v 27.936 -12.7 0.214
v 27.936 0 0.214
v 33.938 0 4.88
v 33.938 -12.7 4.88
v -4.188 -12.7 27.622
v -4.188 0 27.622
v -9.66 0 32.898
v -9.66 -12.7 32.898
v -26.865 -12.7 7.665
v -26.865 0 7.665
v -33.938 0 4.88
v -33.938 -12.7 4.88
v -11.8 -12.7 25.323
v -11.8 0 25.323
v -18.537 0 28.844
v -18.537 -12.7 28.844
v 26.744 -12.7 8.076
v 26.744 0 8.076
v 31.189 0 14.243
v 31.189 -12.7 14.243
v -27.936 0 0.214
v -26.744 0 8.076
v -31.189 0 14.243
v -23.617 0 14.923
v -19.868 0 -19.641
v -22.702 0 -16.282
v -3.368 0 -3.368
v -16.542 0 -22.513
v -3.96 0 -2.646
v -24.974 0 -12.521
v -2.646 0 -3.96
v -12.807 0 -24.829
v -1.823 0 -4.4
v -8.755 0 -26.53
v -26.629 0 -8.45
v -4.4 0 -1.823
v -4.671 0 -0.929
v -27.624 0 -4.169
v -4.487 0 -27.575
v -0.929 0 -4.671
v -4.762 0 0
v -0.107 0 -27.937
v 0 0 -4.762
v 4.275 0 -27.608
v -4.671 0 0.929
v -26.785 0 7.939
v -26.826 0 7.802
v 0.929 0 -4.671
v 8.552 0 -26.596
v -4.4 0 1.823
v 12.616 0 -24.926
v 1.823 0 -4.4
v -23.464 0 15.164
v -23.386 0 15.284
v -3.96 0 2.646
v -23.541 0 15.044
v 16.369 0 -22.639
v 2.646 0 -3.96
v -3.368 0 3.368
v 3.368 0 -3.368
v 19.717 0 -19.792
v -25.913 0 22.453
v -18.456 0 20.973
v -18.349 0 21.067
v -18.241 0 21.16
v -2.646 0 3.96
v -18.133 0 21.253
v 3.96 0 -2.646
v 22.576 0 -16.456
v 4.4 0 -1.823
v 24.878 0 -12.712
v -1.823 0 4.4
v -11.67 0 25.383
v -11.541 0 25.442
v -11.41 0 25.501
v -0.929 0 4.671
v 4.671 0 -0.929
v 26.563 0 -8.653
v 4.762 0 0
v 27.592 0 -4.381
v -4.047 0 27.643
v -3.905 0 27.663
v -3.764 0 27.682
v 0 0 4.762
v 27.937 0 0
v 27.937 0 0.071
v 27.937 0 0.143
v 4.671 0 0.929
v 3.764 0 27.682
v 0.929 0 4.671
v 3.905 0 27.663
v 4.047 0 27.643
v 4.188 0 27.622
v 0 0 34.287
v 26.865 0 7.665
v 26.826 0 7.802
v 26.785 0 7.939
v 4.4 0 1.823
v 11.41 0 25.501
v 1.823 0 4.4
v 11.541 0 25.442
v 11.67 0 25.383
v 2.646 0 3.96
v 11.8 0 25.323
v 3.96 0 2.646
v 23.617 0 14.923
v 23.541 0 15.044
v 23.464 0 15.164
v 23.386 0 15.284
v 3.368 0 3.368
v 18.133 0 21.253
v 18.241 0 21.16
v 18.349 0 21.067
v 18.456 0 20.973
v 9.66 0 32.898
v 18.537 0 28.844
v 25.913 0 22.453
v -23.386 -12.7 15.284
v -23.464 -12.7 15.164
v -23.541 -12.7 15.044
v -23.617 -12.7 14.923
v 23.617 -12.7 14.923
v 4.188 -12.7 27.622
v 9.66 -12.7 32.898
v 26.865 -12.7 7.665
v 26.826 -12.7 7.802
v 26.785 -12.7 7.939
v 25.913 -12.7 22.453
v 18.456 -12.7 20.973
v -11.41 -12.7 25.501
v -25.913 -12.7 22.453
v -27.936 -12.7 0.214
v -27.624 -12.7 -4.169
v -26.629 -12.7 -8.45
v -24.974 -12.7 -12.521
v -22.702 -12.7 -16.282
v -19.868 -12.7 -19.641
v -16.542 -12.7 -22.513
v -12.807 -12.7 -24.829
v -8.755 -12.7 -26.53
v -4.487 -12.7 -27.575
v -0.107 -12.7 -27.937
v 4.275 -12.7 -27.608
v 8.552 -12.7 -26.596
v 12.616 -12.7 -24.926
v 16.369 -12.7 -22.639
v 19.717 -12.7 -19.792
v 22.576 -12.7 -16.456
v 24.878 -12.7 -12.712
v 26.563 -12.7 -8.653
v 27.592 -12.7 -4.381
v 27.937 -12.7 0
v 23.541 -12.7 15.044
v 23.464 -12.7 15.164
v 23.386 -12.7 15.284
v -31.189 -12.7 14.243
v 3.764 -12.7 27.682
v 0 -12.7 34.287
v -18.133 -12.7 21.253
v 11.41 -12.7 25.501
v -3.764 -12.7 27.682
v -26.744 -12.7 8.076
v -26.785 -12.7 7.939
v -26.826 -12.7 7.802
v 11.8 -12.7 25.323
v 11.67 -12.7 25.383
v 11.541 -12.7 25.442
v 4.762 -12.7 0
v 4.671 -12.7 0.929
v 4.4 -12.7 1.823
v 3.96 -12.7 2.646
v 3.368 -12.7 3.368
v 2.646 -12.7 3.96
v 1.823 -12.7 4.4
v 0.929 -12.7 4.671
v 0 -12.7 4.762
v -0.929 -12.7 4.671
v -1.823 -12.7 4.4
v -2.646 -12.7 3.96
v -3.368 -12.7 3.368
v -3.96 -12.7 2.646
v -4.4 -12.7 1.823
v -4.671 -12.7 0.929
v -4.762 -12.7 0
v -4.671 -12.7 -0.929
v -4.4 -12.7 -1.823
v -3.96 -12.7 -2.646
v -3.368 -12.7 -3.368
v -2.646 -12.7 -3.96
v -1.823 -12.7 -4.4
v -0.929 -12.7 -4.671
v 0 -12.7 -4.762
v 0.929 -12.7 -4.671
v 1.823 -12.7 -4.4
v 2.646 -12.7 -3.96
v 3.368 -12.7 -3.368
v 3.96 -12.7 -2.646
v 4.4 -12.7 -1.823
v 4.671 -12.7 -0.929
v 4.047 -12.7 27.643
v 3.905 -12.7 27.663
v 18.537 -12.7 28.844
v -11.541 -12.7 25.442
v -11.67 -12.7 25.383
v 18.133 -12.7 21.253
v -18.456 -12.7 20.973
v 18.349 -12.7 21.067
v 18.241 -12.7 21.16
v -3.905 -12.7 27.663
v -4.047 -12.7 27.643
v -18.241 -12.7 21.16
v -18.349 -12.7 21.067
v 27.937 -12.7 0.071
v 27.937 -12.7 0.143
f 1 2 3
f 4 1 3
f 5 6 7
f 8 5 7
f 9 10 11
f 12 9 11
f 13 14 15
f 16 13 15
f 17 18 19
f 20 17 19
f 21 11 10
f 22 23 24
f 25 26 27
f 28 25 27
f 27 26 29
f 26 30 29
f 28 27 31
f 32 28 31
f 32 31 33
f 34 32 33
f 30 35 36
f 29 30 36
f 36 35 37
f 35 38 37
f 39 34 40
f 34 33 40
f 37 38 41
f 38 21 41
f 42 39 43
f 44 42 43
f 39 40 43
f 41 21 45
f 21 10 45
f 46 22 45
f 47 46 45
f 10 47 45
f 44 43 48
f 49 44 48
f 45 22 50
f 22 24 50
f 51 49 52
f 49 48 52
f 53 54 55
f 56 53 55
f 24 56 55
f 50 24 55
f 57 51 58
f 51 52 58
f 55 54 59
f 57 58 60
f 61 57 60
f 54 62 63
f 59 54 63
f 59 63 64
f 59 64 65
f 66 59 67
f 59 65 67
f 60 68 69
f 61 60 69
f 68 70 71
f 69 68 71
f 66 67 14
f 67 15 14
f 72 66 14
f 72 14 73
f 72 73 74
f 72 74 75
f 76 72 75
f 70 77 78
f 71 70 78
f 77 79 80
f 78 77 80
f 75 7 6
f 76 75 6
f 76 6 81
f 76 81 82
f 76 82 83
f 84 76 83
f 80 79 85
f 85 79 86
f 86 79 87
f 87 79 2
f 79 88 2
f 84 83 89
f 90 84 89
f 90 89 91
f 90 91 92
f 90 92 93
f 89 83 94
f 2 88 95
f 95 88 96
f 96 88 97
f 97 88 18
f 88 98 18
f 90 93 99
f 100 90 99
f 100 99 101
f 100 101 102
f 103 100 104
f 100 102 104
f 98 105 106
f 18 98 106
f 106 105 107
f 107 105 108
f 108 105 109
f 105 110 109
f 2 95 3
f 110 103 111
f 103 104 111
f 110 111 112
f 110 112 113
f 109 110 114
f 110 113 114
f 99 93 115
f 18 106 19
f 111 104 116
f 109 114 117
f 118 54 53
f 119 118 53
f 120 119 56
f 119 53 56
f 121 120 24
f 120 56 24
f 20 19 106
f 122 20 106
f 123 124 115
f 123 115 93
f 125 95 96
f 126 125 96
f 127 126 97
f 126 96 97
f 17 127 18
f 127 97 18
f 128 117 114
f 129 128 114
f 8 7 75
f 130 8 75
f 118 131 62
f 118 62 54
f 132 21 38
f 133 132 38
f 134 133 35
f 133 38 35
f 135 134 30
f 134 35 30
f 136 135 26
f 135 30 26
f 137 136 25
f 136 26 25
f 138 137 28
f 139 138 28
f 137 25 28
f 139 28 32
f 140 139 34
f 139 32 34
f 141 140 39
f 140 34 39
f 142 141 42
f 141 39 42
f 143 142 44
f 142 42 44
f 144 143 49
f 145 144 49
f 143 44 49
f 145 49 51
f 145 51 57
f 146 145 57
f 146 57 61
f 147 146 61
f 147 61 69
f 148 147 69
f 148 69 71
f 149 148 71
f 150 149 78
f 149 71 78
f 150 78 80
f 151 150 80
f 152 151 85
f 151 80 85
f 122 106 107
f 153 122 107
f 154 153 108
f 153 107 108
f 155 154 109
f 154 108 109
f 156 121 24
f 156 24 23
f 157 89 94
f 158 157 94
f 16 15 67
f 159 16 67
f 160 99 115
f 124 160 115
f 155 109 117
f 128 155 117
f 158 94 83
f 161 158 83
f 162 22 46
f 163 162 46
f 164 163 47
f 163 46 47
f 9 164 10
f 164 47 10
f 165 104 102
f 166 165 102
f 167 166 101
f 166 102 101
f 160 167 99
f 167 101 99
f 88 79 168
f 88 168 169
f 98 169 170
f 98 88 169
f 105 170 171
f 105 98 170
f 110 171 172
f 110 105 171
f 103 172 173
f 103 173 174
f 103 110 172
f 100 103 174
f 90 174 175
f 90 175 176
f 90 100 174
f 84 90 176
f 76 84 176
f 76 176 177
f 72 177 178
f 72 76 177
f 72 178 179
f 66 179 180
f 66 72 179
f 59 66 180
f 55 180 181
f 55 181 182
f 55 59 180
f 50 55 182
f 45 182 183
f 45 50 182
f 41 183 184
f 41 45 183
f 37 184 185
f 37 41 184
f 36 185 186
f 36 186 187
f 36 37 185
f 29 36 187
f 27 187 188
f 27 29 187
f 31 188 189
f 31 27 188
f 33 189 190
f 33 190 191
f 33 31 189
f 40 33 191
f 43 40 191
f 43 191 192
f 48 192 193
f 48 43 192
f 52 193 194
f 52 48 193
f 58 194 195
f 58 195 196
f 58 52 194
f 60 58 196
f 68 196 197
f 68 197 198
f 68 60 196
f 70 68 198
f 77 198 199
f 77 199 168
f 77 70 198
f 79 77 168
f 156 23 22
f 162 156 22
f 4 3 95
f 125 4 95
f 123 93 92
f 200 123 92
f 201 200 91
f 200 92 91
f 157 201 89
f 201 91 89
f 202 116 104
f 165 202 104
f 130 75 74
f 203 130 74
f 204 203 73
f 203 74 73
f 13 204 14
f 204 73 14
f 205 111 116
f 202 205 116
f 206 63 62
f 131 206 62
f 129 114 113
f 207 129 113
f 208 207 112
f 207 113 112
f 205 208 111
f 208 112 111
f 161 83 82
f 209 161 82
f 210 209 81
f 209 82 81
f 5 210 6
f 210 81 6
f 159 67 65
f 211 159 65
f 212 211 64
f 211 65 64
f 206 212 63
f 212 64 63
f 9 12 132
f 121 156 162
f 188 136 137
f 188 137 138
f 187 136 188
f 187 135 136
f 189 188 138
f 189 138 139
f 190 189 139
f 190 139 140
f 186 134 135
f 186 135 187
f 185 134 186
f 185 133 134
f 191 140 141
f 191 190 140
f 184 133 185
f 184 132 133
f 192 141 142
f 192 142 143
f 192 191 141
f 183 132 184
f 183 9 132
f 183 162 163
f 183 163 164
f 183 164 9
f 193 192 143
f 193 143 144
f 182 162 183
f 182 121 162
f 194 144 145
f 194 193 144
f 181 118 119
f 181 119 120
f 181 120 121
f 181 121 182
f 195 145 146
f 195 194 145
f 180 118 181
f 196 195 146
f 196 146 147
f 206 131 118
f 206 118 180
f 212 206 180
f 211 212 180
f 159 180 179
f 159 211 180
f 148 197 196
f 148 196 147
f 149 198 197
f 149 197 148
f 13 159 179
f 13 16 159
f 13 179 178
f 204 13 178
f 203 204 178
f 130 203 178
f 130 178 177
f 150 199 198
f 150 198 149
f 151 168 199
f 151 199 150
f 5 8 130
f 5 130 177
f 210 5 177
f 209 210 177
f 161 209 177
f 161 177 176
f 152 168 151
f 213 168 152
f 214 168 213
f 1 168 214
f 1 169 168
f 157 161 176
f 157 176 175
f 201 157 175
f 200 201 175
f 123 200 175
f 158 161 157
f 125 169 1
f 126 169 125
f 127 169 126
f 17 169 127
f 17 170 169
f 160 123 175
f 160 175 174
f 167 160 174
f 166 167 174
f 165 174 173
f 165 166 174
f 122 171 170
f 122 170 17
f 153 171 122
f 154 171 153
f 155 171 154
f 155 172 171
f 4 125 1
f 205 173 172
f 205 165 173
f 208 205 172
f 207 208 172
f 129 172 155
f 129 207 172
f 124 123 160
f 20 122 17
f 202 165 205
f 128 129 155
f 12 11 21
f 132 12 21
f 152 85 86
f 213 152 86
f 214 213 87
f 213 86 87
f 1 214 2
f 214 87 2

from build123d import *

# Parameters (mm, degrees)
F1_DEPTH = 12.7
F2_R     = 4.7625
F3_DEPTH = 12.7


with BuildPart() as f1:
    # F0 (on Front) → F1 (new body)
    with BuildSketch(Plane.XZ):
        with BuildLine():
            ThreePointArc((26.865064, 7.665134), (27.652819, 3.975875), (27.936358, 0.214121))
            Line((27.936358, 0.214121), (33.938185, 4.879574))
            Line((33.938185, 4.879574), (26.865064, 7.665134))
        make_face()
        with BuildLine():
            ThreePointArc((23.617322, 14.923406), (25.412552, 11.605523), (26.744415, 8.076029))
            Line((26.744415, 8.076029), (31.188715, 14.243409))
            Line((31.188715, 14.243409), (23.617322, 14.923406))
        make_face()
        with BuildLine():
            ThreePointArc((18.456246, 20.972672), (21.113511, 18.294961), (23.385798, 15.283665))
            Line((23.385798, 15.283665), (25.912521, 22.453327))
            Line((25.912521, 22.453327), (18.456246, 20.972672))
        make_face()
        with BuildLine():
            ThreePointArc((11.799954, 25.322856), (15.103979, 23.50225), (18.132602, 21.25311))
            Line((18.132602, 21.25311), (18.537048, 28.84421))
            Line((18.537048, 28.84421), (11.799954, 25.322856))
        make_face()
        with BuildLine():
            ThreePointArc((-27.936358, 0.214121), (-0.107061, -27.936974), (27.937179, 0))
            ThreePointArc((27.937179, 0), (27.936974, 0.107061), (27.936358, 0.214121))
            ThreePointArc((27.936358, 0.214121), (27.652819, 3.975875), (26.865064, 7.665134))
            ThreePointArc((26.865064, 7.665134), (26.805527, 7.870813), (26.744415, 8.076029))
            ThreePointArc((26.744415, 8.076029), (25.412552, 11.605523), (23.617322, 14.923406))
            ThreePointArc((23.617322, 14.923406), (23.50225, 15.103979), (23.385798, 15.283665))
            ThreePointArc((23.385798, 15.283665), (21.113511, 18.294961), (18.456246, 20.972672))
            ThreePointArc((18.456246, 20.972672), (18.294961, 21.113511), (18.132602, 21.25311))
            ThreePointArc((18.132602, 21.25311), (15.103979, 23.50225), (11.799954, 25.322856))
            ThreePointArc((11.799954, 25.322856), (11.605523, 25.412552), (11.410412, 25.500754))
            ThreePointArc((11.410412, 25.500754), (7.870813, 26.805527), (4.187699, 27.621534))
            ThreePointArc((4.187699, 27.621534), (3.975875, 27.652819), (3.763817, 27.682479))
            ThreePointArc((3.763817, 27.682479), (0, 27.937179), (-3.763817, 27.682479))
            ThreePointArc((-3.763817, 27.682479), (-3.975875, 27.652819), (-4.187699, 27.621534))
            ThreePointArc((-4.187699, 27.621534), (-7.870813, 26.805527), (-11.410412, 25.500754))
            ThreePointArc((-11.410412, 25.500754), (-11.605523, 25.412552), (-11.799954, 25.322856))
            ThreePointArc((-11.799954, 25.322856), (-15.103979, 23.50225), (-18.132602, 21.25311))
            ThreePointArc((-18.132602, 21.25311), (-18.294961, 21.113511), (-18.456246, 20.972672))
            ThreePointArc((-18.456246, 20.972672), (-21.113511, 18.294961), (-23.385798, 15.283665))
            ThreePointArc((-23.385798, 15.283665), (-23.50225, 15.103979), (-23.617322, 14.923406))
            ThreePointArc((-23.617322, 14.923406), (-25.412552, 11.605523), (-26.744415, 8.076029))
            ThreePointArc((-26.744415, 8.076029), (-26.805527, 7.870813), (-26.865064, 7.665134))
            ThreePointArc((-26.865064, 7.665134), (-27.652819, 3.975875), (-27.936358, 0.214121))
        make_face()
        with BuildLine():
            ThreePointArc((4.187699, 27.621534), (7.870813, 26.805527), (11.410412, 25.500754))
            Line((11.410412, 25.500754), (9.659815, 32.898307))
            Line((9.659815, 32.898307), (4.187699, 27.621534))
        make_face()
        with BuildLine():
            ThreePointArc((-3.763817, 27.682479), (0, 27.937179), (3.763817, 27.682479))
            Line((3.763817, 27.682479), (0, 34.287179))
            Line((0, 34.287179), (-3.763817, 27.682479))
        make_face()
        with BuildLine():
            Line((-9.659815, 32.898307), (-11.410412, 25.500754))
            ThreePointArc((-11.410412, 25.500754), (-7.870813, 26.805527), (-4.187699, 27.621534))
            Line((-4.187699, 27.621534), (-9.659815, 32.898307))
        make_face()
        with BuildLine():
            Line((-18.537048, 28.84421), (-18.132602, 21.25311))
            ThreePointArc((-18.132602, 21.25311), (-15.103979, 23.50225), (-11.799954, 25.322856))
            Line((-11.799954, 25.322856), (-18.537048, 28.84421))
        make_face()
        with BuildLine():
            Line((-25.912521, 22.453327), (-23.385798, 15.283665))
            ThreePointArc((-23.385798, 15.283665), (-21.113511, 18.294961), (-18.456246, 20.972672))
            Line((-18.456246, 20.972672), (-25.912521, 22.453327))
        make_face()
        with BuildLine():
            Line((-31.188715, 14.243409), (-26.744415, 8.076029))
            ThreePointArc((-26.744415, 8.076029), (-25.412552, 11.605523), (-23.617322, 14.923406))
            Line((-23.617322, 14.923406), (-31.188715, 14.243409))
        make_face()
        with BuildLine():
            Line((-33.938185, 4.879574), (-27.936358, 0.214121))
            ThreePointArc((-27.936358, 0.214121), (-27.652819, 3.975875), (-26.865064, 7.665134))
            Line((-26.865064, 7.665134), (-33.938185, 4.879574))
        make_face()
    extrude(amount=F1_DEPTH)

    # F2 (on face) → F3 (cut)
    with BuildSketch(Plane.XZ):
        Circle(F2_R)
    extrude(amount=F3_DEPTH, mode=Mode.SUBTRACT)


solid = f1.part
